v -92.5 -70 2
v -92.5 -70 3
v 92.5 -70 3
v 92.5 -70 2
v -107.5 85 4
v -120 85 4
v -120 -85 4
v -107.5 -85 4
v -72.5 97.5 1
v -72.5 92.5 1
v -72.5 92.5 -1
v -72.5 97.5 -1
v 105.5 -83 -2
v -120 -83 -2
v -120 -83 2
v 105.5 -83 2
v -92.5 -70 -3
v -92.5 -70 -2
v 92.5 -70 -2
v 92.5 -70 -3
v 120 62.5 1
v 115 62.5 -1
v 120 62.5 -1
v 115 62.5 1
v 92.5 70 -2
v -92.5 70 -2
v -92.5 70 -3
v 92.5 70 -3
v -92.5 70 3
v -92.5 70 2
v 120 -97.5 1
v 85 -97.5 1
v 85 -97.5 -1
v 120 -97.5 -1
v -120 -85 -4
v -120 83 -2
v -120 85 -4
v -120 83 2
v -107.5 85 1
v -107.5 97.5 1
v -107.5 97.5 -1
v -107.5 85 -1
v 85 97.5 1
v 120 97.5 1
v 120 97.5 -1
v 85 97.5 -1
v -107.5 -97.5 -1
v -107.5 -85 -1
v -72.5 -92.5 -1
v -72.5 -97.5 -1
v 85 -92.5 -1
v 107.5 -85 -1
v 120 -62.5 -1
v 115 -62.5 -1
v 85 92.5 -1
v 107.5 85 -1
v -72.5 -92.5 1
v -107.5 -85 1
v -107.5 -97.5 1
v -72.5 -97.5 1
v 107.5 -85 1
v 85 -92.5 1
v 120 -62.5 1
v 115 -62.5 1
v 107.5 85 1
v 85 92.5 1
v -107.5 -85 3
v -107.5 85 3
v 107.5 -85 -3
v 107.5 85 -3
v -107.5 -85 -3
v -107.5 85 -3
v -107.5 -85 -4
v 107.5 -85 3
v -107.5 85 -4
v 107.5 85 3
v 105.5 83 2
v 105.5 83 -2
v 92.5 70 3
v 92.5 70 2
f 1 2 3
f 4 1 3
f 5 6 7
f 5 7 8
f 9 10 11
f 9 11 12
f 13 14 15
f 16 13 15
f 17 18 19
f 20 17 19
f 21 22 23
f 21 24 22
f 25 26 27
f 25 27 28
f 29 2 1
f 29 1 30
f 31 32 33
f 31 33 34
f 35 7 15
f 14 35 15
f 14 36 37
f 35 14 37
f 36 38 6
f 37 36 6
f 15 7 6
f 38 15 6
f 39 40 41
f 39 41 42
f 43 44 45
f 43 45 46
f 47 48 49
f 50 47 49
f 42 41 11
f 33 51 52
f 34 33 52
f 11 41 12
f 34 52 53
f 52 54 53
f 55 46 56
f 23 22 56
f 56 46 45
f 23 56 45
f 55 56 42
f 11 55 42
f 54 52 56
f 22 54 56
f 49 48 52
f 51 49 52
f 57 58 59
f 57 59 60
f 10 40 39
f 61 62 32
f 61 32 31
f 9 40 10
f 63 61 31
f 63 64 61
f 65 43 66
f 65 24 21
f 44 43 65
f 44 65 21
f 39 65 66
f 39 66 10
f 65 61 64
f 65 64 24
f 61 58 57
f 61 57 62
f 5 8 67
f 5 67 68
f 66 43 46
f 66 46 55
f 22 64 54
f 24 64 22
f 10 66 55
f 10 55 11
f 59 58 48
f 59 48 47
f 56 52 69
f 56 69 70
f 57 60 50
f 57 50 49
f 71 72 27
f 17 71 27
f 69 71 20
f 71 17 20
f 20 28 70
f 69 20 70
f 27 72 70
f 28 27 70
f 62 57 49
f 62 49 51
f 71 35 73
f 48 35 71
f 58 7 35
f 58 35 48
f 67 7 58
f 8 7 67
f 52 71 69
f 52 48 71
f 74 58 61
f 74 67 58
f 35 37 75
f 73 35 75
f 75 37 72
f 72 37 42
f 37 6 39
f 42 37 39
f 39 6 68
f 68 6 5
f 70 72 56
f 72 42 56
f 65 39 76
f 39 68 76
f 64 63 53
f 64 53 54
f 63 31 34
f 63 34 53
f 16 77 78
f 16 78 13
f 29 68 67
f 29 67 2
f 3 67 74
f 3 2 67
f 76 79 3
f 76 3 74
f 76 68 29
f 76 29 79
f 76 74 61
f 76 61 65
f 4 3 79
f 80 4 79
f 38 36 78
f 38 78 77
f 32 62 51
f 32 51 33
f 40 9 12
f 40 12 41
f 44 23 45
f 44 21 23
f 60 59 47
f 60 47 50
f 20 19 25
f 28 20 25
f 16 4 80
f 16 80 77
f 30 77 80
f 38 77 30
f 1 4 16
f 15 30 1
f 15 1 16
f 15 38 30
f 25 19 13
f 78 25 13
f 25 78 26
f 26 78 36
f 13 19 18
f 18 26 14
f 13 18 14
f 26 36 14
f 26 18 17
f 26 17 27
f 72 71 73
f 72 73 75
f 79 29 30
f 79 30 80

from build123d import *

# Parameters (mm, degrees)
F0_W     = 215
F0_H     = 170
F0_W_2   = 185
F0_H_2   = 140
F1_DEPTH = 3
F0_W_3   = 12.5
F2_DEPTH = 4
F3_DEPTH = 1
F4_W     = 166
F4_H     = 4
F5_DEPTH = 225.5


with BuildPart() as f1:
    # F0 (on Top) → F1 (new body, symmetric)
    with BuildSketch(Plane.XY):
        Rectangle(F0_W, F0_H)
        Rectangle(F0_W_2, F0_H_2, mode=Mode.SUBTRACT)
    extrude(amount=F1_DEPTH, both=True)

    # F0 (on Top) → F2 (join, symmetric)
    with BuildSketch(Plane.XY):
        with Locations((-113.75, 0)):
            Rectangle(F0_W_3, F0_H)
    extrude(amount=F2_DEPTH, both=True)

    # F0 (on Top) → F3 (join, symmetric)
    with BuildSketch(Plane.XY):
        Polygon((120, 62.5), (120, 97.5), (85, 97.5), (85, 92.5), (-72.5, 92.5), (-72.5, 97.5), (-107.5, 97.5), (-107.5, 85), (107.5, 85), (107.5, -85), (-107.5, -85), (-107.5, -97.5), (-72.5, -97.5), (-72.5, -92.5), (85, -92.5), (85, -97.5), (120, -97.5), (120, -62.5), (115, -62.5), (115, 62.5), align=None)
    extrude(amount=F3_DEPTH, both=True)

    # F4 (on face) → F5 (cut)
    with BuildSketch(Plane(origin=(-120, 0, 0), x_dir=(0, -1, 0), z_dir=(-1, 0, 0))):
        Rectangle(F4_W, F4_H)
    extrude(amount=-F5_DEPTH, mode=Mode.SUBTRACT)


solid = f1.part
